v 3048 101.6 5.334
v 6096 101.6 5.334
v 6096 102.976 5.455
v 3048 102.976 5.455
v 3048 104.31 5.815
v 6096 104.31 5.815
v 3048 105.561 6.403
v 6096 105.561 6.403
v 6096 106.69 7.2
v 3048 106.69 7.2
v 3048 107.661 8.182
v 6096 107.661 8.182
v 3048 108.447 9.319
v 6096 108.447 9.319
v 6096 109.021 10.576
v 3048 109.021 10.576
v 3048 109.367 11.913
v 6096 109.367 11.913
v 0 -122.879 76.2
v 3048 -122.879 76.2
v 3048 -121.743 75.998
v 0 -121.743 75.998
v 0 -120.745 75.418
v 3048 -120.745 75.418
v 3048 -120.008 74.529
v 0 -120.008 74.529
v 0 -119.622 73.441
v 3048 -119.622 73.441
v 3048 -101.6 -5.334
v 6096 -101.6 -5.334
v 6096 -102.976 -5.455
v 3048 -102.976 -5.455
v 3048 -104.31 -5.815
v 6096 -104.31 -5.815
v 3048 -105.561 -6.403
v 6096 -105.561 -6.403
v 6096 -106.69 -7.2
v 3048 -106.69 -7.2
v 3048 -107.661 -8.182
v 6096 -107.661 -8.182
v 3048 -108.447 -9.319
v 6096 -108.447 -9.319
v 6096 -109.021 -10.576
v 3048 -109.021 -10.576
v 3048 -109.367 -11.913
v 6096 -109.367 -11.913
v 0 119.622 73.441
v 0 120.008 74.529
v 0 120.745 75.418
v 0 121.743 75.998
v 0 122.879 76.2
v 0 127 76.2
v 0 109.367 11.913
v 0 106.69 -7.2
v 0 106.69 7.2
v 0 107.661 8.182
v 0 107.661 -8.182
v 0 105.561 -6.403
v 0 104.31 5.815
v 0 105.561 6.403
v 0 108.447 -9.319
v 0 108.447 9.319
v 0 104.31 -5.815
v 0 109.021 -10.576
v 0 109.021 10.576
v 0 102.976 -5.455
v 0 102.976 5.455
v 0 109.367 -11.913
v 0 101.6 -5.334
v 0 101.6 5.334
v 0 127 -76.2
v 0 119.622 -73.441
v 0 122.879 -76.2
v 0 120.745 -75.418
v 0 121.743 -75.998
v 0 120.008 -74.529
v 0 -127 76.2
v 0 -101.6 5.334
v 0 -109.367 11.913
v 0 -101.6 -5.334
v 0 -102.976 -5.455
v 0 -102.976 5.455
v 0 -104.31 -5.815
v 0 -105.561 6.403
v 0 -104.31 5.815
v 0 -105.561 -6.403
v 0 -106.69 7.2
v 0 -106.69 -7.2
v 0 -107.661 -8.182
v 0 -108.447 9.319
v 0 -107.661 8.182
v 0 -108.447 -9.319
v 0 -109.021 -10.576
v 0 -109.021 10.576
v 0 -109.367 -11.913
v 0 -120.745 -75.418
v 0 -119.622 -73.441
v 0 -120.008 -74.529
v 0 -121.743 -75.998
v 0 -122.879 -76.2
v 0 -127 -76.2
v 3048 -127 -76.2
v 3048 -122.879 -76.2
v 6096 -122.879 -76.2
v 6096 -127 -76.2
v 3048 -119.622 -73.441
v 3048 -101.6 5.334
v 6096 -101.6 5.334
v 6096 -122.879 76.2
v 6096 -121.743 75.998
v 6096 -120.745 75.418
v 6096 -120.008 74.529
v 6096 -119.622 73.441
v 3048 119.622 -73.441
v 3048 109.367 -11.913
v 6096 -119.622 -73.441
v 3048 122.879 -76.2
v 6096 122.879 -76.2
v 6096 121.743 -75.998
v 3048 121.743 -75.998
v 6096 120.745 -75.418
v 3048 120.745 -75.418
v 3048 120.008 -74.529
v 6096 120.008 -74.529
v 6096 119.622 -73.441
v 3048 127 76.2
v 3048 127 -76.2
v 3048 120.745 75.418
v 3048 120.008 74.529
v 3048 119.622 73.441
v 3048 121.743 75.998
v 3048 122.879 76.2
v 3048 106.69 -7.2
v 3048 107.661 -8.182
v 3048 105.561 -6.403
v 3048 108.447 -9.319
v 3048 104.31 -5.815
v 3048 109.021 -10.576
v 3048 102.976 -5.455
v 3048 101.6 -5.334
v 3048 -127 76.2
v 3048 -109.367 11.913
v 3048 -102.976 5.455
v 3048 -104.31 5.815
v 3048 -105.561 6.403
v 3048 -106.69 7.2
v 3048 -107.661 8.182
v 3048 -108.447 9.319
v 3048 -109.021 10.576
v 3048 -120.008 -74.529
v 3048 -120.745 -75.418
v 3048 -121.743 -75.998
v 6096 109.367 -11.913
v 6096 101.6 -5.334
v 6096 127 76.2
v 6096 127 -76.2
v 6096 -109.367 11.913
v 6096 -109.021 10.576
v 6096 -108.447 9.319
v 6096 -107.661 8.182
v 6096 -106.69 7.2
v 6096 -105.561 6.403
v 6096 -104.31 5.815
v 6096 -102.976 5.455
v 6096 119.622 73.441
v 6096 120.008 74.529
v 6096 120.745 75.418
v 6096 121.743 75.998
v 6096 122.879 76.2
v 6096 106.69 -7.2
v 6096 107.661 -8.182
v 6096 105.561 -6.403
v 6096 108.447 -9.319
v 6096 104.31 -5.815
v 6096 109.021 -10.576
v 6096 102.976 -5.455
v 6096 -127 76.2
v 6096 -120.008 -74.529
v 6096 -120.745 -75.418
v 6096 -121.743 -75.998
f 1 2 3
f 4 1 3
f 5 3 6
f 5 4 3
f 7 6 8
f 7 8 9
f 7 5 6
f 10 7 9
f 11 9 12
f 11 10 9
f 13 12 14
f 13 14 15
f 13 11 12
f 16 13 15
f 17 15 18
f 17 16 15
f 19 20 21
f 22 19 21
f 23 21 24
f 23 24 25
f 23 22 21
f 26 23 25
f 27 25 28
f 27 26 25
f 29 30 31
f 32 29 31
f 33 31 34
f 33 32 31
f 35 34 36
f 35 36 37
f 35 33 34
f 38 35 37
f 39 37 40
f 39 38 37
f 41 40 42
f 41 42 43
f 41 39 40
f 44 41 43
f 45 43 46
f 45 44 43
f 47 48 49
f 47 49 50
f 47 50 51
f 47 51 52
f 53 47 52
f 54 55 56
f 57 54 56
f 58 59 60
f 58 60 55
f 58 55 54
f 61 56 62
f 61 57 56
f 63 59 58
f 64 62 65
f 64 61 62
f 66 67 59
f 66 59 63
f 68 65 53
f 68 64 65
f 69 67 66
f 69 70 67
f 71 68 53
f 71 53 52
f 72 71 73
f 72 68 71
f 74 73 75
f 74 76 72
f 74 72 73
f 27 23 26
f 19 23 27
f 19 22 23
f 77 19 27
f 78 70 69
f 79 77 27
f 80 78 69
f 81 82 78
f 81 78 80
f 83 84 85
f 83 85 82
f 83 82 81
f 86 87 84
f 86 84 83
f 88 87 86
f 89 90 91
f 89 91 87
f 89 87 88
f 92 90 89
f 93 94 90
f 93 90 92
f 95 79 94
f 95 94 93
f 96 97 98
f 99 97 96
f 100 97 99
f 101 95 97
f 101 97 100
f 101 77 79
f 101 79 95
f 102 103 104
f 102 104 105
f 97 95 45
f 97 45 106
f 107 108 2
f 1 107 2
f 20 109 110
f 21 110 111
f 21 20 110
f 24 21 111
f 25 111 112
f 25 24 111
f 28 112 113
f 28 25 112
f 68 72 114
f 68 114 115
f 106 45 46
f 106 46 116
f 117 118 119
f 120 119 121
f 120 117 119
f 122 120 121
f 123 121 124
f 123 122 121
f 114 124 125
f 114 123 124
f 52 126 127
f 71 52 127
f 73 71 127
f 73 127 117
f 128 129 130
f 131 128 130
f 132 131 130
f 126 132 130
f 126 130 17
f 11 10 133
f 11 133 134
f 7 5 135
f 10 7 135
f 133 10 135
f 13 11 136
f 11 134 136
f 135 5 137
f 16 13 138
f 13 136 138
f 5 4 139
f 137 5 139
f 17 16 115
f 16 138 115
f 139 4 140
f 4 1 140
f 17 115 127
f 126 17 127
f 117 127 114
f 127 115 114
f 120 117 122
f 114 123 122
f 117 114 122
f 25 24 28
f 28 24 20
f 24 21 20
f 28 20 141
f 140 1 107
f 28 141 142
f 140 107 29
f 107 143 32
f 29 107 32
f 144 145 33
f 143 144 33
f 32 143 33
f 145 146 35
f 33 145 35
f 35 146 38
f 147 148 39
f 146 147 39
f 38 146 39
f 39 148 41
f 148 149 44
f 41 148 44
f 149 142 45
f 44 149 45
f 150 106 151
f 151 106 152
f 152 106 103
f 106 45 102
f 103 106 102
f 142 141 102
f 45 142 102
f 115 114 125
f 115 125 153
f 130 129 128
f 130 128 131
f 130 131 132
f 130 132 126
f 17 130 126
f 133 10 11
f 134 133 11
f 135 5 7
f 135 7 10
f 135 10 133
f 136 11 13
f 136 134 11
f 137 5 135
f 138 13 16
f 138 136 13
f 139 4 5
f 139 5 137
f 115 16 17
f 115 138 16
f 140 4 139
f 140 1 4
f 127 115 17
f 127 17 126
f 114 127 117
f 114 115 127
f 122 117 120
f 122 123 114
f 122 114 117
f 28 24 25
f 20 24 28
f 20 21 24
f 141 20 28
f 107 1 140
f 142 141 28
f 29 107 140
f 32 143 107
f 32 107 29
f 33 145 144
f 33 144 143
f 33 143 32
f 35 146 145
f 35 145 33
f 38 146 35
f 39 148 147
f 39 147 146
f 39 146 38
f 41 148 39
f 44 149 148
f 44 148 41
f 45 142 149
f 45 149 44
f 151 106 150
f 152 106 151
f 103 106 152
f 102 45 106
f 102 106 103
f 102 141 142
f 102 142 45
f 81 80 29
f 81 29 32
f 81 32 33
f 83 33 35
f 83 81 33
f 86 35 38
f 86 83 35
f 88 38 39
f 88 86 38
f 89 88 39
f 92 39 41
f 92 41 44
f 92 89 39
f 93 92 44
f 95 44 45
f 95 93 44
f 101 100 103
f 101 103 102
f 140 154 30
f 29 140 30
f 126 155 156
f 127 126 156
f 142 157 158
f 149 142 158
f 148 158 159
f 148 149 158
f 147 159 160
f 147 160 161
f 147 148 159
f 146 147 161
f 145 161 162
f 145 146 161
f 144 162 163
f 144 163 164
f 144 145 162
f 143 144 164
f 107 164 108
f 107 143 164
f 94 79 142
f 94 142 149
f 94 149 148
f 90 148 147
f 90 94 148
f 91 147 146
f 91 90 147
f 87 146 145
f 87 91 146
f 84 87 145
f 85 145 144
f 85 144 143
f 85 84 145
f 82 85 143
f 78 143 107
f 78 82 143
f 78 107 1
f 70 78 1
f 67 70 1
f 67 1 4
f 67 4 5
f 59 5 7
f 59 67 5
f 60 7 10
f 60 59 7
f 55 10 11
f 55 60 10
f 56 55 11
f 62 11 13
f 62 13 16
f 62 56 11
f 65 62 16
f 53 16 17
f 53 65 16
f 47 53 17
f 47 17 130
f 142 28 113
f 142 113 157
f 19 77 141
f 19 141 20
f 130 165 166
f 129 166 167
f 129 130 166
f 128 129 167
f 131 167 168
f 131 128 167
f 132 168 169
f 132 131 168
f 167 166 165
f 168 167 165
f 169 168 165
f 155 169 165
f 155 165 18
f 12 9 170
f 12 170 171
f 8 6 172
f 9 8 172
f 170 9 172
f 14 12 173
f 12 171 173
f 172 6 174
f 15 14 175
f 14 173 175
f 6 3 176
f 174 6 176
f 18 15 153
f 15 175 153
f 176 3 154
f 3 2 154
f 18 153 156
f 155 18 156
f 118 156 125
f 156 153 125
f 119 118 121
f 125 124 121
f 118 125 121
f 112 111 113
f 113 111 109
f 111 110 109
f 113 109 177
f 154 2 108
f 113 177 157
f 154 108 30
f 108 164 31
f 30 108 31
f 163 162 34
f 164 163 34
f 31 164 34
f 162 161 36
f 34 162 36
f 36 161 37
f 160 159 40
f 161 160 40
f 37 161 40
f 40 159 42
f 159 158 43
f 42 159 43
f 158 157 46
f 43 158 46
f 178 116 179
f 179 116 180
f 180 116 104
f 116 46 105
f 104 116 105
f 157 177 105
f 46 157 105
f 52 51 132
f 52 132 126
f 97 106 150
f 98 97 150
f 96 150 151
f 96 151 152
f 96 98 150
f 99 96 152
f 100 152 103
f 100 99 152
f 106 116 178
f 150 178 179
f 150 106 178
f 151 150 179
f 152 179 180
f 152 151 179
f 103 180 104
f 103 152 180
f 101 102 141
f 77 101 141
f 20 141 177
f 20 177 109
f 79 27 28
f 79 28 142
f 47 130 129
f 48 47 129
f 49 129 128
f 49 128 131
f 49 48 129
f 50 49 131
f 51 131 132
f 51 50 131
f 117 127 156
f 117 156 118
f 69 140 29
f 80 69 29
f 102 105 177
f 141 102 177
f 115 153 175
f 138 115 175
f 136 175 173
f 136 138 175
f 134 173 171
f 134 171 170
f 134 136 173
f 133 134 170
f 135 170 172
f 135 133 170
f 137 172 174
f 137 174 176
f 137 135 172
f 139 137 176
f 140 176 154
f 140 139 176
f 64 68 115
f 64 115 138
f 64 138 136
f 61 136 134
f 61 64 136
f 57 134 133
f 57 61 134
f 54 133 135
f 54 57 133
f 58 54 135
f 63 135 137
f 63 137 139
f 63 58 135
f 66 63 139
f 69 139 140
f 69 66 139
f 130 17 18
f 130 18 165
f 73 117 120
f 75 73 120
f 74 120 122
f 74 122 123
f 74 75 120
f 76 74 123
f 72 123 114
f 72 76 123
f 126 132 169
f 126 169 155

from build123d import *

# Parameters (mm, degrees)
STRUCTURAL_MEMBER1_DEPTH   = 3048
STRUCTURAL_MEMBER1_2_DEPTH = 3048


with BuildPart() as part:
    # Sketch11 → Structural Member1 (new body)
    with BuildSketch(Plane(origin=(0, 0, 0), x_dir=(0, 0, 1), z_dir=(1, 0, 0))):
        with BuildLine():
            Line((-76.2, -127), (-76.2, -122.87924041))
            ThreePointArc((-76.2, -122.87924041), (-75.417504606, -120.744925405), (-73.440883986, -119.622174095))
            Line((-73.440883986, -119.622174095), (-11.913430494, -109.366850442))
            ThreePointArc((-11.913430494, -109.366850442), (-7.199950554, -106.689520396), (-5.334, -101.6))
            Line((-5.334, -101.6), (-5.334, 101.6))
            ThreePointArc((-5.334, 101.6), (-7.199950554, 106.689520396), (-11.913430494, 109.366850442))
            Line((-11.913430494, 109.366850442), (-73.440883986, 119.622174095))
            ThreePointArc((-73.440883986, 119.622174095), (-75.417504606, 120.744925405), (-76.2, 122.87924041))
            Line((-76.2, 122.87924041), (-76.2, 127))
            Line((-76.2, 127), (76.2, 127))
            Line((76.2, 127), (76.2, 122.87924041))
            ThreePointArc((76.2, 122.87924041), (75.417504606, 120.744925405), (73.440883986, 119.622174095))
            Line((73.440883986, 119.622174095), (11.913430494, 109.366850442))
            ThreePointArc((11.913430494, 109.366850442), (7.199950554, 106.689520396), (5.334, 101.6))
            Line((5.334, 101.6), (5.334, -101.6))
            ThreePointArc((5.334, -101.6), (7.199950554, -106.689520396), (11.913430494, -109.366850442))
            Line((11.913430494, -109.366850442), (73.440883986, -119.622174095))
            ThreePointArc((73.440883986, -119.622174095), (75.417504606, -120.744925405), (76.2, -122.87924041))
            Line((76.2, -122.87924041), (76.2, -127))
            Line((76.2, -127), (-76.2, -127))
        make_face()
    extrude(amount=STRUCTURAL_MEMBER1_DEPTH)


with BuildPart() as body_2:
    # Sketch11 on segment 2 (carried to segment 2) → Structural Member1 2 (new body)
    with BuildSketch(Plane(origin=(3048, 0, 0), x_dir=(0, 0, 1), z_dir=(1, 0, 0))):
        with BuildLine():
            Line((-76.2, -127), (-76.2, -122.87924041))
            ThreePointArc((-76.2, -122.87924041), (-75.417504606, -120.744925405), (-73.440883986, -119.622174095))
            Line((-73.440883986, -119.622174095), (-11.913430494, -109.366850442))
            ThreePointArc((-11.913430494, -109.366850442), (-7.199950554, -106.689520396), (-5.334, -101.6))
            Line((-5.334, -101.6), (-5.334, 101.6))
            ThreePointArc((-5.334, 101.6), (-7.199950554, 106.689520396), (-11.913430494, 109.366850442))
            Line((-11.913430494, 109.366850442), (-73.440883986, 119.622174095))
            ThreePointArc((-73.440883986, 119.622174095), (-75.417504606, 120.744925405), (-76.2, 122.87924041))
            Line((-76.2, 122.87924041), (-76.2, 127))
            Line((-76.2, 127), (76.2, 127))
            Line((76.2, 127), (76.2, 122.87924041))
            ThreePointArc((76.2, 122.87924041), (75.417504606, 120.744925405), (73.440883986, 119.622174095))
            Line((73.440883986, 119.622174095), (11.913430494, 109.366850442))
            ThreePointArc((11.913430494, 109.366850442), (7.199950554, 106.689520396), (5.334, 101.6))
            Line((5.334, 101.6), (5.334, -101.6))
            ThreePointArc((5.334, -101.6), (7.199950554, -106.689520396), (11.913430494, -109.366850442))
            Line((11.913430494, -109.366850442), (73.440883986, -119.622174095))
            ThreePointArc((73.440883986, -119.622174095), (75.417504606, -120.744925405), (76.2, -122.87924041))
            Line((76.2, -122.87924041), (76.2, -127))
            Line((76.2, -127), (-76.2, -127))
        make_face()
    extrude(amount=STRUCTURAL_MEMBER1_2_DEPTH)


solid = Compound([part.part, body_2.part])
